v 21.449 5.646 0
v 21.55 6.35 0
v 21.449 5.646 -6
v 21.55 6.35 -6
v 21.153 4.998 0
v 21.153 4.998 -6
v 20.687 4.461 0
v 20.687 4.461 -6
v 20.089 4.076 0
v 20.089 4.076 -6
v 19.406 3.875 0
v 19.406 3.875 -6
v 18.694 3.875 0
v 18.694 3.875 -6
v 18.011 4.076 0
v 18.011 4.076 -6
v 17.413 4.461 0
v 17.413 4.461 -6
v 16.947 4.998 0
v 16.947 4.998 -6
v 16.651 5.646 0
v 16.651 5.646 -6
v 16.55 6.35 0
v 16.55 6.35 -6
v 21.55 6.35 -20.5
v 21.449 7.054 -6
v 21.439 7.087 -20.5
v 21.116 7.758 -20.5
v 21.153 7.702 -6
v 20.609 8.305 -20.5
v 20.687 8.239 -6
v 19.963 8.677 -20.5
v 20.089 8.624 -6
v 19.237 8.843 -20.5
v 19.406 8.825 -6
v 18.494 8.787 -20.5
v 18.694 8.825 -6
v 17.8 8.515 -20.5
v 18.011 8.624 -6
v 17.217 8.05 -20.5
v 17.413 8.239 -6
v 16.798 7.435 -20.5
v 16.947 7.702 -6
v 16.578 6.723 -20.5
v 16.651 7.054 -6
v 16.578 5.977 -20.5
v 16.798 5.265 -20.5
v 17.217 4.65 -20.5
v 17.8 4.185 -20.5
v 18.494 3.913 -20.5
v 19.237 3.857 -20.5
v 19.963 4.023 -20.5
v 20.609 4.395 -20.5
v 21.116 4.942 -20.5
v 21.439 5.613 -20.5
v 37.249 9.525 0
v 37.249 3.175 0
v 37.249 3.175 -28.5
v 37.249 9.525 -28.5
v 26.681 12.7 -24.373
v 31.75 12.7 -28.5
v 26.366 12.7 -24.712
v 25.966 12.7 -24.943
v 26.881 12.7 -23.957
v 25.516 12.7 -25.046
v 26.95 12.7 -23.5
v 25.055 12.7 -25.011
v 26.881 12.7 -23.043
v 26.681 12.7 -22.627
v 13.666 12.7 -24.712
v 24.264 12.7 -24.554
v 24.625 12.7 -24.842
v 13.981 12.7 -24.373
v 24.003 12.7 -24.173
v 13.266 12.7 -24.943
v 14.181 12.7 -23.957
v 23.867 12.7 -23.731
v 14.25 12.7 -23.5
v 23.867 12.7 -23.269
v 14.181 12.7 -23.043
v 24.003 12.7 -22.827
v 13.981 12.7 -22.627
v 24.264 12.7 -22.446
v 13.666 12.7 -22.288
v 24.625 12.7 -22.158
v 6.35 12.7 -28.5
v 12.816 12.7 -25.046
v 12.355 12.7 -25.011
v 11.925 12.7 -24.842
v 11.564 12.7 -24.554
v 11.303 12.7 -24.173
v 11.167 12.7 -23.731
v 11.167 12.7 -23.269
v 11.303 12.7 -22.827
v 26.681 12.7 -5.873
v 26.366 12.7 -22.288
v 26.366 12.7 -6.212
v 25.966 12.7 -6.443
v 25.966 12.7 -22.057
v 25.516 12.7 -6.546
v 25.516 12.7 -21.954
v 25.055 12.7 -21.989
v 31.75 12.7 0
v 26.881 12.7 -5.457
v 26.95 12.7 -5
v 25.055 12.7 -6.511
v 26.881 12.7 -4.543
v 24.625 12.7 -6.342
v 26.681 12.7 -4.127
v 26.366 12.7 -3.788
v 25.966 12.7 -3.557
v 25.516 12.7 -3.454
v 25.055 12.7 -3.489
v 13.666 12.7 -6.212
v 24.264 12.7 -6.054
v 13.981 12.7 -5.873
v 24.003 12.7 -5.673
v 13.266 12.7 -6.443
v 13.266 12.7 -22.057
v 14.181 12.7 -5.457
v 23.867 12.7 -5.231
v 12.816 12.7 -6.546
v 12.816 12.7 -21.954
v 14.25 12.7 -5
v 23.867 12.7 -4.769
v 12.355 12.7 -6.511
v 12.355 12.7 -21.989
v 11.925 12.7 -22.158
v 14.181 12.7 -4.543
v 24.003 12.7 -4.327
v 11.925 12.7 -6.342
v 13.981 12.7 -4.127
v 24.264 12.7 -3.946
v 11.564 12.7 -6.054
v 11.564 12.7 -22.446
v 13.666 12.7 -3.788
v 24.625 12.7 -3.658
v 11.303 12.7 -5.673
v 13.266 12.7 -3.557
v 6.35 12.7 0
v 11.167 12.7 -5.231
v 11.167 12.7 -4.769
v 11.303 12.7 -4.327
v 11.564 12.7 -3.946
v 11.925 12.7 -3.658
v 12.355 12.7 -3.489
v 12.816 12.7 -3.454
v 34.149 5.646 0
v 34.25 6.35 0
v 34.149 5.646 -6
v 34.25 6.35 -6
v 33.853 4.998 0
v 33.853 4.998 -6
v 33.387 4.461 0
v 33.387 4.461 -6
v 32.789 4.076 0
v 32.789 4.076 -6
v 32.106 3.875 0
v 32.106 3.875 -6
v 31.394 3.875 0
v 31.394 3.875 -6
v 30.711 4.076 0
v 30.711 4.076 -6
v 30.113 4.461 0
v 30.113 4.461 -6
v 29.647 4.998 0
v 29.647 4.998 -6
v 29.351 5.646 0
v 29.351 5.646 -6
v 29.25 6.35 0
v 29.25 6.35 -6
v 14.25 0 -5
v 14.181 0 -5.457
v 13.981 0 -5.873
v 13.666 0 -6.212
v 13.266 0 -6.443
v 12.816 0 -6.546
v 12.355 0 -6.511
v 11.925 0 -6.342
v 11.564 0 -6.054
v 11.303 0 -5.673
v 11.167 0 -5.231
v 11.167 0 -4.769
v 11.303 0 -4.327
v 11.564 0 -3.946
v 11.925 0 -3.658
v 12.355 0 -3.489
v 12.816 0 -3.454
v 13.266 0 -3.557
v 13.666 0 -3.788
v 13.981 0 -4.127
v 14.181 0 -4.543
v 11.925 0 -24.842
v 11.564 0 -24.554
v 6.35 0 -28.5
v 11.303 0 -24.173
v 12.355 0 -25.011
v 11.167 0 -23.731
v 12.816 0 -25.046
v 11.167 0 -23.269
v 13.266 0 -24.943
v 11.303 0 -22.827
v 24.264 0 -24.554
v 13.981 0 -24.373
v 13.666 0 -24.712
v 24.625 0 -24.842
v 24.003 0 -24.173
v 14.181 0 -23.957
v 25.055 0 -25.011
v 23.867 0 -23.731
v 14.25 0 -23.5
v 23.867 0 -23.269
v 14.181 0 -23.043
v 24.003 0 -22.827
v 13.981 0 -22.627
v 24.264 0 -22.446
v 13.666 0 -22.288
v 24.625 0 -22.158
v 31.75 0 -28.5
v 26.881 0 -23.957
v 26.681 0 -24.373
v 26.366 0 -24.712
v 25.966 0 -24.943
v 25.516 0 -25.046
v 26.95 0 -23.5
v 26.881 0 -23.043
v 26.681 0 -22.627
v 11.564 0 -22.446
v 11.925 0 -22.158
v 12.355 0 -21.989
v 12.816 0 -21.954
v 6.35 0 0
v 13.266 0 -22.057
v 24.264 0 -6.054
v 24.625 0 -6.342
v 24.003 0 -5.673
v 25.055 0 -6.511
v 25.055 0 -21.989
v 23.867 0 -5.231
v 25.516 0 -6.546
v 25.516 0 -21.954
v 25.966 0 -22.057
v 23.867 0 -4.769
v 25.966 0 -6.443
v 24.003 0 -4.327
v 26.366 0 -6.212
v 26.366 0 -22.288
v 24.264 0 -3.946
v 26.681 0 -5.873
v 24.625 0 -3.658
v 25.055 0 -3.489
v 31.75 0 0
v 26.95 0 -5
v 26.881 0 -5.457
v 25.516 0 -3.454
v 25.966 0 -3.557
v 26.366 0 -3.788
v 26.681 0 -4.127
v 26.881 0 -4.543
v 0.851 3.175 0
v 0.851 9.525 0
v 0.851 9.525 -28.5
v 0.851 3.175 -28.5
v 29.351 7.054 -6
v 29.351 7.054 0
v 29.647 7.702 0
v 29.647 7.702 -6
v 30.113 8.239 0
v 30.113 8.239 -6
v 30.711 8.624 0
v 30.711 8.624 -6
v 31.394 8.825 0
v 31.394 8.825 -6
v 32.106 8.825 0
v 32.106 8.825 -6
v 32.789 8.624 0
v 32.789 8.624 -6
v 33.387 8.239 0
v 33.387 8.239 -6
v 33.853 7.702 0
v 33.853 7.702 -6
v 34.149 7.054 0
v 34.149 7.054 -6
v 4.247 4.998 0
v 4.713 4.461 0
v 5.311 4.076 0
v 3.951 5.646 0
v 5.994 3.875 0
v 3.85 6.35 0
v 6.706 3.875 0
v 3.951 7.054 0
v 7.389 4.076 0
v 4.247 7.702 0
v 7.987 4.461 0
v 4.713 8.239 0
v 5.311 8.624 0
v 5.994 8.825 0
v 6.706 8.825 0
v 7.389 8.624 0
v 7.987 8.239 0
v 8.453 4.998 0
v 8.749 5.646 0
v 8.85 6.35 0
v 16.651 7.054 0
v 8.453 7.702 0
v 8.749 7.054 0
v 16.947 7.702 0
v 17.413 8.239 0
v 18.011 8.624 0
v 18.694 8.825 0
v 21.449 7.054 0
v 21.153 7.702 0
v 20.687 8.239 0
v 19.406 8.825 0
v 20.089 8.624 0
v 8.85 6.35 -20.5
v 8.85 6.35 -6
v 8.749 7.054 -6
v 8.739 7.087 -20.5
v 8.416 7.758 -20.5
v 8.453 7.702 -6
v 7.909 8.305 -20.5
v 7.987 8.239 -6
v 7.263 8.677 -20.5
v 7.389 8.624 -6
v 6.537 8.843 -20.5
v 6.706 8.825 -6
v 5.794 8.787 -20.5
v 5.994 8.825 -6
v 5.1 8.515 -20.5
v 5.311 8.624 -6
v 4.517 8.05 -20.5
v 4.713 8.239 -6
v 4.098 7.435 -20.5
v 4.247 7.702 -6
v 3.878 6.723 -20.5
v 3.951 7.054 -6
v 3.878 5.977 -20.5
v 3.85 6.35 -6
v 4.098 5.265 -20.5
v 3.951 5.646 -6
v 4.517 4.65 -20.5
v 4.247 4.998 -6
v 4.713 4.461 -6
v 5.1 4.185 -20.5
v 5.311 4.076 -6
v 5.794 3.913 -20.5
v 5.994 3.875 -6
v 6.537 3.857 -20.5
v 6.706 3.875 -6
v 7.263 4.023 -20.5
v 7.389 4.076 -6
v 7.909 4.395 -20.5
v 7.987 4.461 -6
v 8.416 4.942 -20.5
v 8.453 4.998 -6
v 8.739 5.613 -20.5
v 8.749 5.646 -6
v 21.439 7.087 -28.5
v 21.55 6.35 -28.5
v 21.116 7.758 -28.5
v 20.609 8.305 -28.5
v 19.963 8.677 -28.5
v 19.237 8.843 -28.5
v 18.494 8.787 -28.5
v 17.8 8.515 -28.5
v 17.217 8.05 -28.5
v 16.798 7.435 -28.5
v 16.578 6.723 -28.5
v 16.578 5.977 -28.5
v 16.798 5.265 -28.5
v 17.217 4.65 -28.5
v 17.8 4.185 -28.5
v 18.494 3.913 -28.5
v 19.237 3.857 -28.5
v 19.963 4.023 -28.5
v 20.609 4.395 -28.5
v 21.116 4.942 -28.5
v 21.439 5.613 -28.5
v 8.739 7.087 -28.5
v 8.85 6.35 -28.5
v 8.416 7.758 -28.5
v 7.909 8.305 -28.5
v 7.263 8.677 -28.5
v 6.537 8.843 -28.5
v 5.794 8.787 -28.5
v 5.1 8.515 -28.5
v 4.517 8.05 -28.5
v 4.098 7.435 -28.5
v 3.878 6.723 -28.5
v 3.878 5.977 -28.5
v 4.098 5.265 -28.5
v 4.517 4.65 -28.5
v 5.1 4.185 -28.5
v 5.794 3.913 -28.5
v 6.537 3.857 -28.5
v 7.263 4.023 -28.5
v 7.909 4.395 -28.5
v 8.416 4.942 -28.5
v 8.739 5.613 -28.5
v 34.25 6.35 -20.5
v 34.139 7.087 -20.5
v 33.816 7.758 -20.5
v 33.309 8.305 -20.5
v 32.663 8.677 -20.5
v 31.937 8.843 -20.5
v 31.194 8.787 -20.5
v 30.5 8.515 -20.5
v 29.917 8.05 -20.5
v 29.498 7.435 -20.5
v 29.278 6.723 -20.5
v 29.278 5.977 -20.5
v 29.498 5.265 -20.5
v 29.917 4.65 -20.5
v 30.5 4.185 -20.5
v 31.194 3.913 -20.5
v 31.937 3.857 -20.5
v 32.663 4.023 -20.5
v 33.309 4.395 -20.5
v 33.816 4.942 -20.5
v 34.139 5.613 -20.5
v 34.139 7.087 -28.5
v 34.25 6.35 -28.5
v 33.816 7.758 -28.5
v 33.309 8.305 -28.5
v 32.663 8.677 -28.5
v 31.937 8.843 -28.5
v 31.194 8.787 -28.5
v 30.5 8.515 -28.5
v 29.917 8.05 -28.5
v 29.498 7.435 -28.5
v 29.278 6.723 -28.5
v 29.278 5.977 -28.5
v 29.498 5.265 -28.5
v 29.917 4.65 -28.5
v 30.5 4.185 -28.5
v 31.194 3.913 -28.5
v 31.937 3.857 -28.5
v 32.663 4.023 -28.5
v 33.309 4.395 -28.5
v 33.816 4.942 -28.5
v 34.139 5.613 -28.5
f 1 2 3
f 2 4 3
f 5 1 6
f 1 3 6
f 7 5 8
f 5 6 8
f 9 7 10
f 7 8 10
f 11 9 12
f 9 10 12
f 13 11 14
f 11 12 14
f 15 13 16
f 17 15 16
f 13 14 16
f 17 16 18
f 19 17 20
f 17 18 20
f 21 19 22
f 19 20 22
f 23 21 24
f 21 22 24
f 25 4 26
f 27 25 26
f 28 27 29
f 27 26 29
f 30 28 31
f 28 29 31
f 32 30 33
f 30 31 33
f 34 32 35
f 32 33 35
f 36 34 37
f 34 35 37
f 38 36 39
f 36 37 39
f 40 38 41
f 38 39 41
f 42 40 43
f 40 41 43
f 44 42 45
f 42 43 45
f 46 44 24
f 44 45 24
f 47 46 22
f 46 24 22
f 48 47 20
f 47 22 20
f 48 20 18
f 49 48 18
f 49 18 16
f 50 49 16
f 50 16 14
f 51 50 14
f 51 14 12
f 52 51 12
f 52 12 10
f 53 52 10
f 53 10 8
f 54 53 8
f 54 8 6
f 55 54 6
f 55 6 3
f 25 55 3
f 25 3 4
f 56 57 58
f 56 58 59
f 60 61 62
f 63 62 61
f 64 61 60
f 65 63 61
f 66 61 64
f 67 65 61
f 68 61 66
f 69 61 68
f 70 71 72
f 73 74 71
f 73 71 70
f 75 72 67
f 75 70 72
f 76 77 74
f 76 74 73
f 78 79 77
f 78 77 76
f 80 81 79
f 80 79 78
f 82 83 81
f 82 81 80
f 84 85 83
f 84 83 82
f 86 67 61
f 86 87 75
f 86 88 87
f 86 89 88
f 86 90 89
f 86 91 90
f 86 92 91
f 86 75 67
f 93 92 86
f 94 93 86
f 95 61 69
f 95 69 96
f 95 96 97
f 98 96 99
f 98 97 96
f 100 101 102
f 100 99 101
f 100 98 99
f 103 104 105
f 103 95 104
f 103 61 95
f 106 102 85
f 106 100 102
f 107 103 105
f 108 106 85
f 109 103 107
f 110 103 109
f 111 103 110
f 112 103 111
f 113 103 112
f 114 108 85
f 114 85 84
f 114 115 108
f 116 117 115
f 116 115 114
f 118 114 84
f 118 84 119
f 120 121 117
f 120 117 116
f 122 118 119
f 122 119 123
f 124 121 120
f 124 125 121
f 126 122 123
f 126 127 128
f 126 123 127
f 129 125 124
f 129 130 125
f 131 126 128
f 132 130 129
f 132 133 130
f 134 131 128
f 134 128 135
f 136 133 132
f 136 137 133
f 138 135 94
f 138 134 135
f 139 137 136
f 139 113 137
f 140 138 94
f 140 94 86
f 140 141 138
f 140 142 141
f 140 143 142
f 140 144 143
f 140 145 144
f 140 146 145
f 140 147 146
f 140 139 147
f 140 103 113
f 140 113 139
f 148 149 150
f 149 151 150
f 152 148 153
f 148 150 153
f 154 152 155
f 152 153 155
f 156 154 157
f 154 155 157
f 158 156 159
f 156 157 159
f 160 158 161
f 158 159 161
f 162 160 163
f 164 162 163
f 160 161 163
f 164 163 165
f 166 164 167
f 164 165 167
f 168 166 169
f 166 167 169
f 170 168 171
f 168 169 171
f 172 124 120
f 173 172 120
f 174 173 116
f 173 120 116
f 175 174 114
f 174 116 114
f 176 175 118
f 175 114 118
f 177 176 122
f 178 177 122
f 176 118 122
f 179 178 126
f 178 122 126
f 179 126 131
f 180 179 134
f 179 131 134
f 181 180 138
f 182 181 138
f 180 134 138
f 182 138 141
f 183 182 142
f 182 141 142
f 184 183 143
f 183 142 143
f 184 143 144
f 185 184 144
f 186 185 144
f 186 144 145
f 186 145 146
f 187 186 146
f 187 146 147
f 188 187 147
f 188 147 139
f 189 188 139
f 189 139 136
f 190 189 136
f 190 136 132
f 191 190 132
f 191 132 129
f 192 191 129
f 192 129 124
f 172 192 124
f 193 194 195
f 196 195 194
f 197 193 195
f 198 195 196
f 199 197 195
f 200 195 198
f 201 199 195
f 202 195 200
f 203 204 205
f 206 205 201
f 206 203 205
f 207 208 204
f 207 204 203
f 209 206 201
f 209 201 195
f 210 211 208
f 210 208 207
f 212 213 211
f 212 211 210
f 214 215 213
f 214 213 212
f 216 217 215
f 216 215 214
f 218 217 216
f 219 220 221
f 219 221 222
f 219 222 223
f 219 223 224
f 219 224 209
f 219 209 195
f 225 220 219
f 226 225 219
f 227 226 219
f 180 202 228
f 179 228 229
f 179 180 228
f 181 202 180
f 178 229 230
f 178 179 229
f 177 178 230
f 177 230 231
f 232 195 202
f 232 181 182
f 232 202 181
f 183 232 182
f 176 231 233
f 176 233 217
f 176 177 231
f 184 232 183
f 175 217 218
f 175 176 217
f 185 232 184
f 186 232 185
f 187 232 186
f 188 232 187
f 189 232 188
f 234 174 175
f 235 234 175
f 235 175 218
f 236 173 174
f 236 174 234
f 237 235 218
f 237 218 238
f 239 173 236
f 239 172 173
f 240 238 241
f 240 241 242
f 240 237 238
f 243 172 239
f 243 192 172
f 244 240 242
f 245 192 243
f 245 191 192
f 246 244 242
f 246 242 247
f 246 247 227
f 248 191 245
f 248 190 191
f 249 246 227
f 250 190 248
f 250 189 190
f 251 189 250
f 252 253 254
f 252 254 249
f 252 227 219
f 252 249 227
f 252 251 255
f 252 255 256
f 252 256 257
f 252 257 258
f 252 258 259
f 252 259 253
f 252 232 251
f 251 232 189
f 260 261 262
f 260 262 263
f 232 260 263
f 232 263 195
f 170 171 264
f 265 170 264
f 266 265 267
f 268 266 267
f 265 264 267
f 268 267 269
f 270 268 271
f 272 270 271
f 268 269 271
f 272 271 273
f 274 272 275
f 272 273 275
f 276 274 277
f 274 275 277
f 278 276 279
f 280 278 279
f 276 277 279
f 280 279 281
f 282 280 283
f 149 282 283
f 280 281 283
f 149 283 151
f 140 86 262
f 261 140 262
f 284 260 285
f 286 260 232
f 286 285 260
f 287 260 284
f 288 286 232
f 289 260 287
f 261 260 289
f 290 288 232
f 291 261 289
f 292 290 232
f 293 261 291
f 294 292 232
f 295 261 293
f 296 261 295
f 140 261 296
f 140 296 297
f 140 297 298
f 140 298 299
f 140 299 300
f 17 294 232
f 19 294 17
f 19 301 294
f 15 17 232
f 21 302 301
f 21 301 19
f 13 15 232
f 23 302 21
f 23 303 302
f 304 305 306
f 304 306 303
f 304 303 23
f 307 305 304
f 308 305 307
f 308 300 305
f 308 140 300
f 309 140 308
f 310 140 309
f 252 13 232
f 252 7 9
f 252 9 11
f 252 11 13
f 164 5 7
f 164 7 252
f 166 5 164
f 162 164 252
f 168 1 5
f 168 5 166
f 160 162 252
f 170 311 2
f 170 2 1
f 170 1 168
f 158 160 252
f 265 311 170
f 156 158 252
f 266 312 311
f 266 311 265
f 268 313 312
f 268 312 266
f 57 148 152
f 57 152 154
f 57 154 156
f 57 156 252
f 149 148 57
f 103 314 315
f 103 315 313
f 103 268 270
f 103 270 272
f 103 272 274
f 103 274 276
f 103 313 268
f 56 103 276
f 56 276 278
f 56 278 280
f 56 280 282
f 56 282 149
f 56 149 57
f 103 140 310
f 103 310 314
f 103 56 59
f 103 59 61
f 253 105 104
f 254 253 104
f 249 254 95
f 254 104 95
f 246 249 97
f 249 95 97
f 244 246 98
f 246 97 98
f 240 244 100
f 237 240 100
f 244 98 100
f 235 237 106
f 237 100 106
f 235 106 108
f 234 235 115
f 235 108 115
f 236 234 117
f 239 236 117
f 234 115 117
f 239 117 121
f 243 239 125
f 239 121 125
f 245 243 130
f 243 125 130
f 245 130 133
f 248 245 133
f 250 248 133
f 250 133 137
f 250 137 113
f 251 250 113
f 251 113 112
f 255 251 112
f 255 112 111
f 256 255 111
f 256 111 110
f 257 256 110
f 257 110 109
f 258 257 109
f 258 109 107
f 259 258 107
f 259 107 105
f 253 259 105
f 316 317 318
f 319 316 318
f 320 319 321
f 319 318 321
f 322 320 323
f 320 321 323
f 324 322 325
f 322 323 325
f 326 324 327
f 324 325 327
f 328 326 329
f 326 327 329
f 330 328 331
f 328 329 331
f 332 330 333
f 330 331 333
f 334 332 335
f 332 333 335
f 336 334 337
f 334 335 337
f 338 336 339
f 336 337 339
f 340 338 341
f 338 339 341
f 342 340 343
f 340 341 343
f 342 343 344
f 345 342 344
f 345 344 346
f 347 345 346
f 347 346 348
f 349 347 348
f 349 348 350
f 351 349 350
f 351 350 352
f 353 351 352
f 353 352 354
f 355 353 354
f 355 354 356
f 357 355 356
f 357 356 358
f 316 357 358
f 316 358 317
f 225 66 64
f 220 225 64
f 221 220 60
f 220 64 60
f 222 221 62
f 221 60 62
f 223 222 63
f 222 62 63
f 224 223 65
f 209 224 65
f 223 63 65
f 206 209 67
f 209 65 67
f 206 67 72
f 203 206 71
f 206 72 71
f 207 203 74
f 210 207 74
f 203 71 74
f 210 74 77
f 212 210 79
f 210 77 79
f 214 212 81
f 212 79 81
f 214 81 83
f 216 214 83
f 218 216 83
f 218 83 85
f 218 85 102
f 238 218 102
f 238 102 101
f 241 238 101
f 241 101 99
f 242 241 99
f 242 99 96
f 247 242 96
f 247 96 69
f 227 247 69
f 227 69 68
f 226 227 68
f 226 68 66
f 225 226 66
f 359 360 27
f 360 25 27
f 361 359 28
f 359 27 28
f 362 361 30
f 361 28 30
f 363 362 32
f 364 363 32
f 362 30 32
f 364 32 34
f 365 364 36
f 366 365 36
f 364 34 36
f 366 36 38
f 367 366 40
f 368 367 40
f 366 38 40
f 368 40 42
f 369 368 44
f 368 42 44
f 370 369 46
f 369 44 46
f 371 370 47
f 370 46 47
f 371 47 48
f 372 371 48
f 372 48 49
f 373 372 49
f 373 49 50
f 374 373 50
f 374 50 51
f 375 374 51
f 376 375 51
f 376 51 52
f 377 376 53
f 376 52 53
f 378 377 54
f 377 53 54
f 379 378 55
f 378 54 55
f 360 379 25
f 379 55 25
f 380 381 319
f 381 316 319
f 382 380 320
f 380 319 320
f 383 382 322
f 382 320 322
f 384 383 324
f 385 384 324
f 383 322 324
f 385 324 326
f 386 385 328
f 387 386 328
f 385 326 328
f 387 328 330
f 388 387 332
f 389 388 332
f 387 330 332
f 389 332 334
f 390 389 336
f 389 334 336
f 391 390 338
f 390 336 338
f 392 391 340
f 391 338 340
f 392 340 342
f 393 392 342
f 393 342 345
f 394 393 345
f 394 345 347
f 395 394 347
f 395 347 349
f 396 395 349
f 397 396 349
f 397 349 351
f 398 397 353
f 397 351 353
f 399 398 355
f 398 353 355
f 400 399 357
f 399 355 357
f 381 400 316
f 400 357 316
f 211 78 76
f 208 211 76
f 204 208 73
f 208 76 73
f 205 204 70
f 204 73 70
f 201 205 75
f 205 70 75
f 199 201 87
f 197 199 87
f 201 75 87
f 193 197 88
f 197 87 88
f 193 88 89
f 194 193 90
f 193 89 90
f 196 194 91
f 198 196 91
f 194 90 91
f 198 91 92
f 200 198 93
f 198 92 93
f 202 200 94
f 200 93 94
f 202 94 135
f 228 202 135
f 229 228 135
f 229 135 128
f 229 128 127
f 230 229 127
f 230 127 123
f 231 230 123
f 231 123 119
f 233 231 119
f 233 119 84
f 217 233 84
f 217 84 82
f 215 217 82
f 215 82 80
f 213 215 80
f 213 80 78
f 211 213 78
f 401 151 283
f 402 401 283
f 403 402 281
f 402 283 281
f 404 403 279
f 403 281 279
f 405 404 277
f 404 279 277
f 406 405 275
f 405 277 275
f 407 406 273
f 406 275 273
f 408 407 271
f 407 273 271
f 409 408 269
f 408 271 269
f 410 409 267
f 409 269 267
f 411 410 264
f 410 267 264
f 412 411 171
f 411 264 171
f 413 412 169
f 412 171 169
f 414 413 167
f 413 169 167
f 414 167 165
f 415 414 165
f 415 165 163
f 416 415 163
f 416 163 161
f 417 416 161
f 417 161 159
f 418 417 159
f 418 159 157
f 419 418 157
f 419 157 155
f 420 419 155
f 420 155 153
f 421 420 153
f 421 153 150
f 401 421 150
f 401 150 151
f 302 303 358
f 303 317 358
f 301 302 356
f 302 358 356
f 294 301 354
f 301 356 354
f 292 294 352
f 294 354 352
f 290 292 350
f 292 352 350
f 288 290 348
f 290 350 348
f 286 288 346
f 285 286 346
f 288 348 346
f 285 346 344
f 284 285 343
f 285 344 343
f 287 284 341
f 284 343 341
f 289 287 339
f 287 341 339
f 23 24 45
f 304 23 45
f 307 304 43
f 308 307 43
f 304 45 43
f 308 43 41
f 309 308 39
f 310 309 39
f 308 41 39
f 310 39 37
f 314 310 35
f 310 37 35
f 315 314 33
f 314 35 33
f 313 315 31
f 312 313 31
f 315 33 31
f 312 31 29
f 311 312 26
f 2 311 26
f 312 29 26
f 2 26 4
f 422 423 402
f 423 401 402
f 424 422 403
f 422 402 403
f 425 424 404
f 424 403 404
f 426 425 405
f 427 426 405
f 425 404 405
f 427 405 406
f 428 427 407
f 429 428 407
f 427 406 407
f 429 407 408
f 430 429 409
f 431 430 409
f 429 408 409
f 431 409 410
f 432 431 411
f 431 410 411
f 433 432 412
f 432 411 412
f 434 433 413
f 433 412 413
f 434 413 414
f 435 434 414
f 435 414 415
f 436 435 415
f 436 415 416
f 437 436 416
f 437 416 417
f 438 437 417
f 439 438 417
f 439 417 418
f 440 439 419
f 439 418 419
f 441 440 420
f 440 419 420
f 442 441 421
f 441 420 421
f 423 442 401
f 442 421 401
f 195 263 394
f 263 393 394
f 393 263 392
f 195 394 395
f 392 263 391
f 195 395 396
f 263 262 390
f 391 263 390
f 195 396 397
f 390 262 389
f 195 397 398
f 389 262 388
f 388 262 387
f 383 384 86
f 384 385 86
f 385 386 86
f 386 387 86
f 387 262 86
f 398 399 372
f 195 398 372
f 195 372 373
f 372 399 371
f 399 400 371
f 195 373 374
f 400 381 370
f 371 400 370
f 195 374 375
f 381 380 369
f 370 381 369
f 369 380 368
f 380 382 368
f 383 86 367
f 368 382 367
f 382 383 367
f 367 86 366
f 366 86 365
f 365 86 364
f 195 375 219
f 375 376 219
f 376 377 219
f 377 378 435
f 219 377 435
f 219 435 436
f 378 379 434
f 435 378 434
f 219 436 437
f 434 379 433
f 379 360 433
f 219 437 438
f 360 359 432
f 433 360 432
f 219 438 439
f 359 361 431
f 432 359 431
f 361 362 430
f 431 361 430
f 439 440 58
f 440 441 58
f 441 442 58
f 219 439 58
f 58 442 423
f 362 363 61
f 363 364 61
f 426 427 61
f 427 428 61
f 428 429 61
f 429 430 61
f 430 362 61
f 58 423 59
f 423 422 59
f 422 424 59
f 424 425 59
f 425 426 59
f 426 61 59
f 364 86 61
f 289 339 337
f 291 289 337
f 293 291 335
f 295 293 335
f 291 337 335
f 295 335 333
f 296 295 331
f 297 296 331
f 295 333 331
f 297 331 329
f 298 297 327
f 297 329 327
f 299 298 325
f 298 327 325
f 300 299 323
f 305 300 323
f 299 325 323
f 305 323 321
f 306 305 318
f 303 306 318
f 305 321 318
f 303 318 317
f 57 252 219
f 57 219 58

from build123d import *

# Parameters (mm, degrees)
BOSS_EXTRUDE1_DEPTH   = 28.5
M6_TAPPED_HOLE1_D     = 5
M6_TAPPED_HOLE1_DEPTH = 6
M6_TAPPED_HOLE1_TIP   = 1.502151548
M6_TAPPED_HOLE2_D     = 5
M6_TAPPED_HOLE2_DEPTH = 8
M6_TAPPED_HOLE2_TIP   = 1.502151548
SKETCH6_R             = 2.5
CUT_EXTRUDE2_DEPTH    = 29.5
SKETCH5_R             = 1.55
CUT_EXTRUDE1_DEPTH    = 13.7


with BuildPart() as part:
    # Sketch1 → Boss-Extrude1 (new body)
    with BuildSketch(Plane.XY):
        Polygon((11.849261314, 3.175), (6.35, 0), (31.75, 0), (26.250738686, 3.175), (26.250738686, 9.525), (31.75, 12.7), (6.35, 12.7), (11.849261314, 9.525), align=None)
        Polygon((0.850738686, 9.525), (0.850738686, 3.175), (6.35, 0), (11.849261314, 3.175), (11.849261314, 9.525), (6.35, 12.7), align=None)
        Polygon((26.250738686, 9.525), (26.250738686, 3.175), (31.75, 0), (37.249261314, 3.175), (37.249261314, 9.525), (31.75, 12.7), align=None)
    extrude(amount=-BOSS_EXTRUDE1_DEPTH)

    # M6 Tapped Hole1
    with Locations(Plane.XY):
        with Locations((19.05, 6.35), (31.75, 6.35), (6.35, 6.35)):
            Hole(M6_TAPPED_HOLE1_D / 2, depth=M6_TAPPED_HOLE1_DEPTH)
            with Locations((0, 0, -(M6_TAPPED_HOLE1_DEPTH + M6_TAPPED_HOLE1_TIP / 2))):  # 118° drill point
                Cone(0, M6_TAPPED_HOLE1_D / 2, M6_TAPPED_HOLE1_TIP, mode=Mode.SUBTRACT)

    # M6 Tapped Hole2
    with Locations(Plane(origin=(0, 0, -28.5), x_dir=(-1, 0, 0), z_dir=(0, 0, -1))):
        with Locations((-31.75, 6.35), (-19.05, 6.35), (-6.35, 6.35)):
            Hole(M6_TAPPED_HOLE2_D / 2, depth=M6_TAPPED_HOLE2_DEPTH)
            with Locations((0, 0, -(M6_TAPPED_HOLE2_DEPTH + M6_TAPPED_HOLE2_TIP / 2))):  # 118° drill point
                Cone(0, M6_TAPPED_HOLE2_D / 2, M6_TAPPED_HOLE2_TIP, mode=Mode.SUBTRACT)

    # Sketch6 → Cut-Extrude2 (cut, through all)
    with BuildSketch(Plane.XY):
        with Locations((6.35, 6.35)):
            Circle(SKETCH6_R)
        with Locations((19.05, 6.35)):
            Circle(SKETCH6_R)
        with Locations((31.75, 6.35)):
            Circle(SKETCH6_R)
    extrude(amount=-CUT_EXTRUDE2_DEPTH, mode=Mode.SUBTRACT)

    # Sketch5 → Cut-Extrude1 (cut, through all)
    with BuildSketch(Plane(origin=(0, 12.7, 0), x_dir=(1, 0, 0), z_dir=(0, 1, 0))):
        with Locations((12.7, 23.5)):
            Circle(SKETCH5_R)
        with Locations((25.4, 23.5)):
            Circle(SKETCH5_R)
        with Locations((25.4, 5)):
            Circle(SKETCH5_R)
        with Locations((12.7, 5)):
            Circle(SKETCH5_R)
    extrude(amount=-CUT_EXTRUDE1_DEPTH, mode=Mode.SUBTRACT)


solid = part.part
